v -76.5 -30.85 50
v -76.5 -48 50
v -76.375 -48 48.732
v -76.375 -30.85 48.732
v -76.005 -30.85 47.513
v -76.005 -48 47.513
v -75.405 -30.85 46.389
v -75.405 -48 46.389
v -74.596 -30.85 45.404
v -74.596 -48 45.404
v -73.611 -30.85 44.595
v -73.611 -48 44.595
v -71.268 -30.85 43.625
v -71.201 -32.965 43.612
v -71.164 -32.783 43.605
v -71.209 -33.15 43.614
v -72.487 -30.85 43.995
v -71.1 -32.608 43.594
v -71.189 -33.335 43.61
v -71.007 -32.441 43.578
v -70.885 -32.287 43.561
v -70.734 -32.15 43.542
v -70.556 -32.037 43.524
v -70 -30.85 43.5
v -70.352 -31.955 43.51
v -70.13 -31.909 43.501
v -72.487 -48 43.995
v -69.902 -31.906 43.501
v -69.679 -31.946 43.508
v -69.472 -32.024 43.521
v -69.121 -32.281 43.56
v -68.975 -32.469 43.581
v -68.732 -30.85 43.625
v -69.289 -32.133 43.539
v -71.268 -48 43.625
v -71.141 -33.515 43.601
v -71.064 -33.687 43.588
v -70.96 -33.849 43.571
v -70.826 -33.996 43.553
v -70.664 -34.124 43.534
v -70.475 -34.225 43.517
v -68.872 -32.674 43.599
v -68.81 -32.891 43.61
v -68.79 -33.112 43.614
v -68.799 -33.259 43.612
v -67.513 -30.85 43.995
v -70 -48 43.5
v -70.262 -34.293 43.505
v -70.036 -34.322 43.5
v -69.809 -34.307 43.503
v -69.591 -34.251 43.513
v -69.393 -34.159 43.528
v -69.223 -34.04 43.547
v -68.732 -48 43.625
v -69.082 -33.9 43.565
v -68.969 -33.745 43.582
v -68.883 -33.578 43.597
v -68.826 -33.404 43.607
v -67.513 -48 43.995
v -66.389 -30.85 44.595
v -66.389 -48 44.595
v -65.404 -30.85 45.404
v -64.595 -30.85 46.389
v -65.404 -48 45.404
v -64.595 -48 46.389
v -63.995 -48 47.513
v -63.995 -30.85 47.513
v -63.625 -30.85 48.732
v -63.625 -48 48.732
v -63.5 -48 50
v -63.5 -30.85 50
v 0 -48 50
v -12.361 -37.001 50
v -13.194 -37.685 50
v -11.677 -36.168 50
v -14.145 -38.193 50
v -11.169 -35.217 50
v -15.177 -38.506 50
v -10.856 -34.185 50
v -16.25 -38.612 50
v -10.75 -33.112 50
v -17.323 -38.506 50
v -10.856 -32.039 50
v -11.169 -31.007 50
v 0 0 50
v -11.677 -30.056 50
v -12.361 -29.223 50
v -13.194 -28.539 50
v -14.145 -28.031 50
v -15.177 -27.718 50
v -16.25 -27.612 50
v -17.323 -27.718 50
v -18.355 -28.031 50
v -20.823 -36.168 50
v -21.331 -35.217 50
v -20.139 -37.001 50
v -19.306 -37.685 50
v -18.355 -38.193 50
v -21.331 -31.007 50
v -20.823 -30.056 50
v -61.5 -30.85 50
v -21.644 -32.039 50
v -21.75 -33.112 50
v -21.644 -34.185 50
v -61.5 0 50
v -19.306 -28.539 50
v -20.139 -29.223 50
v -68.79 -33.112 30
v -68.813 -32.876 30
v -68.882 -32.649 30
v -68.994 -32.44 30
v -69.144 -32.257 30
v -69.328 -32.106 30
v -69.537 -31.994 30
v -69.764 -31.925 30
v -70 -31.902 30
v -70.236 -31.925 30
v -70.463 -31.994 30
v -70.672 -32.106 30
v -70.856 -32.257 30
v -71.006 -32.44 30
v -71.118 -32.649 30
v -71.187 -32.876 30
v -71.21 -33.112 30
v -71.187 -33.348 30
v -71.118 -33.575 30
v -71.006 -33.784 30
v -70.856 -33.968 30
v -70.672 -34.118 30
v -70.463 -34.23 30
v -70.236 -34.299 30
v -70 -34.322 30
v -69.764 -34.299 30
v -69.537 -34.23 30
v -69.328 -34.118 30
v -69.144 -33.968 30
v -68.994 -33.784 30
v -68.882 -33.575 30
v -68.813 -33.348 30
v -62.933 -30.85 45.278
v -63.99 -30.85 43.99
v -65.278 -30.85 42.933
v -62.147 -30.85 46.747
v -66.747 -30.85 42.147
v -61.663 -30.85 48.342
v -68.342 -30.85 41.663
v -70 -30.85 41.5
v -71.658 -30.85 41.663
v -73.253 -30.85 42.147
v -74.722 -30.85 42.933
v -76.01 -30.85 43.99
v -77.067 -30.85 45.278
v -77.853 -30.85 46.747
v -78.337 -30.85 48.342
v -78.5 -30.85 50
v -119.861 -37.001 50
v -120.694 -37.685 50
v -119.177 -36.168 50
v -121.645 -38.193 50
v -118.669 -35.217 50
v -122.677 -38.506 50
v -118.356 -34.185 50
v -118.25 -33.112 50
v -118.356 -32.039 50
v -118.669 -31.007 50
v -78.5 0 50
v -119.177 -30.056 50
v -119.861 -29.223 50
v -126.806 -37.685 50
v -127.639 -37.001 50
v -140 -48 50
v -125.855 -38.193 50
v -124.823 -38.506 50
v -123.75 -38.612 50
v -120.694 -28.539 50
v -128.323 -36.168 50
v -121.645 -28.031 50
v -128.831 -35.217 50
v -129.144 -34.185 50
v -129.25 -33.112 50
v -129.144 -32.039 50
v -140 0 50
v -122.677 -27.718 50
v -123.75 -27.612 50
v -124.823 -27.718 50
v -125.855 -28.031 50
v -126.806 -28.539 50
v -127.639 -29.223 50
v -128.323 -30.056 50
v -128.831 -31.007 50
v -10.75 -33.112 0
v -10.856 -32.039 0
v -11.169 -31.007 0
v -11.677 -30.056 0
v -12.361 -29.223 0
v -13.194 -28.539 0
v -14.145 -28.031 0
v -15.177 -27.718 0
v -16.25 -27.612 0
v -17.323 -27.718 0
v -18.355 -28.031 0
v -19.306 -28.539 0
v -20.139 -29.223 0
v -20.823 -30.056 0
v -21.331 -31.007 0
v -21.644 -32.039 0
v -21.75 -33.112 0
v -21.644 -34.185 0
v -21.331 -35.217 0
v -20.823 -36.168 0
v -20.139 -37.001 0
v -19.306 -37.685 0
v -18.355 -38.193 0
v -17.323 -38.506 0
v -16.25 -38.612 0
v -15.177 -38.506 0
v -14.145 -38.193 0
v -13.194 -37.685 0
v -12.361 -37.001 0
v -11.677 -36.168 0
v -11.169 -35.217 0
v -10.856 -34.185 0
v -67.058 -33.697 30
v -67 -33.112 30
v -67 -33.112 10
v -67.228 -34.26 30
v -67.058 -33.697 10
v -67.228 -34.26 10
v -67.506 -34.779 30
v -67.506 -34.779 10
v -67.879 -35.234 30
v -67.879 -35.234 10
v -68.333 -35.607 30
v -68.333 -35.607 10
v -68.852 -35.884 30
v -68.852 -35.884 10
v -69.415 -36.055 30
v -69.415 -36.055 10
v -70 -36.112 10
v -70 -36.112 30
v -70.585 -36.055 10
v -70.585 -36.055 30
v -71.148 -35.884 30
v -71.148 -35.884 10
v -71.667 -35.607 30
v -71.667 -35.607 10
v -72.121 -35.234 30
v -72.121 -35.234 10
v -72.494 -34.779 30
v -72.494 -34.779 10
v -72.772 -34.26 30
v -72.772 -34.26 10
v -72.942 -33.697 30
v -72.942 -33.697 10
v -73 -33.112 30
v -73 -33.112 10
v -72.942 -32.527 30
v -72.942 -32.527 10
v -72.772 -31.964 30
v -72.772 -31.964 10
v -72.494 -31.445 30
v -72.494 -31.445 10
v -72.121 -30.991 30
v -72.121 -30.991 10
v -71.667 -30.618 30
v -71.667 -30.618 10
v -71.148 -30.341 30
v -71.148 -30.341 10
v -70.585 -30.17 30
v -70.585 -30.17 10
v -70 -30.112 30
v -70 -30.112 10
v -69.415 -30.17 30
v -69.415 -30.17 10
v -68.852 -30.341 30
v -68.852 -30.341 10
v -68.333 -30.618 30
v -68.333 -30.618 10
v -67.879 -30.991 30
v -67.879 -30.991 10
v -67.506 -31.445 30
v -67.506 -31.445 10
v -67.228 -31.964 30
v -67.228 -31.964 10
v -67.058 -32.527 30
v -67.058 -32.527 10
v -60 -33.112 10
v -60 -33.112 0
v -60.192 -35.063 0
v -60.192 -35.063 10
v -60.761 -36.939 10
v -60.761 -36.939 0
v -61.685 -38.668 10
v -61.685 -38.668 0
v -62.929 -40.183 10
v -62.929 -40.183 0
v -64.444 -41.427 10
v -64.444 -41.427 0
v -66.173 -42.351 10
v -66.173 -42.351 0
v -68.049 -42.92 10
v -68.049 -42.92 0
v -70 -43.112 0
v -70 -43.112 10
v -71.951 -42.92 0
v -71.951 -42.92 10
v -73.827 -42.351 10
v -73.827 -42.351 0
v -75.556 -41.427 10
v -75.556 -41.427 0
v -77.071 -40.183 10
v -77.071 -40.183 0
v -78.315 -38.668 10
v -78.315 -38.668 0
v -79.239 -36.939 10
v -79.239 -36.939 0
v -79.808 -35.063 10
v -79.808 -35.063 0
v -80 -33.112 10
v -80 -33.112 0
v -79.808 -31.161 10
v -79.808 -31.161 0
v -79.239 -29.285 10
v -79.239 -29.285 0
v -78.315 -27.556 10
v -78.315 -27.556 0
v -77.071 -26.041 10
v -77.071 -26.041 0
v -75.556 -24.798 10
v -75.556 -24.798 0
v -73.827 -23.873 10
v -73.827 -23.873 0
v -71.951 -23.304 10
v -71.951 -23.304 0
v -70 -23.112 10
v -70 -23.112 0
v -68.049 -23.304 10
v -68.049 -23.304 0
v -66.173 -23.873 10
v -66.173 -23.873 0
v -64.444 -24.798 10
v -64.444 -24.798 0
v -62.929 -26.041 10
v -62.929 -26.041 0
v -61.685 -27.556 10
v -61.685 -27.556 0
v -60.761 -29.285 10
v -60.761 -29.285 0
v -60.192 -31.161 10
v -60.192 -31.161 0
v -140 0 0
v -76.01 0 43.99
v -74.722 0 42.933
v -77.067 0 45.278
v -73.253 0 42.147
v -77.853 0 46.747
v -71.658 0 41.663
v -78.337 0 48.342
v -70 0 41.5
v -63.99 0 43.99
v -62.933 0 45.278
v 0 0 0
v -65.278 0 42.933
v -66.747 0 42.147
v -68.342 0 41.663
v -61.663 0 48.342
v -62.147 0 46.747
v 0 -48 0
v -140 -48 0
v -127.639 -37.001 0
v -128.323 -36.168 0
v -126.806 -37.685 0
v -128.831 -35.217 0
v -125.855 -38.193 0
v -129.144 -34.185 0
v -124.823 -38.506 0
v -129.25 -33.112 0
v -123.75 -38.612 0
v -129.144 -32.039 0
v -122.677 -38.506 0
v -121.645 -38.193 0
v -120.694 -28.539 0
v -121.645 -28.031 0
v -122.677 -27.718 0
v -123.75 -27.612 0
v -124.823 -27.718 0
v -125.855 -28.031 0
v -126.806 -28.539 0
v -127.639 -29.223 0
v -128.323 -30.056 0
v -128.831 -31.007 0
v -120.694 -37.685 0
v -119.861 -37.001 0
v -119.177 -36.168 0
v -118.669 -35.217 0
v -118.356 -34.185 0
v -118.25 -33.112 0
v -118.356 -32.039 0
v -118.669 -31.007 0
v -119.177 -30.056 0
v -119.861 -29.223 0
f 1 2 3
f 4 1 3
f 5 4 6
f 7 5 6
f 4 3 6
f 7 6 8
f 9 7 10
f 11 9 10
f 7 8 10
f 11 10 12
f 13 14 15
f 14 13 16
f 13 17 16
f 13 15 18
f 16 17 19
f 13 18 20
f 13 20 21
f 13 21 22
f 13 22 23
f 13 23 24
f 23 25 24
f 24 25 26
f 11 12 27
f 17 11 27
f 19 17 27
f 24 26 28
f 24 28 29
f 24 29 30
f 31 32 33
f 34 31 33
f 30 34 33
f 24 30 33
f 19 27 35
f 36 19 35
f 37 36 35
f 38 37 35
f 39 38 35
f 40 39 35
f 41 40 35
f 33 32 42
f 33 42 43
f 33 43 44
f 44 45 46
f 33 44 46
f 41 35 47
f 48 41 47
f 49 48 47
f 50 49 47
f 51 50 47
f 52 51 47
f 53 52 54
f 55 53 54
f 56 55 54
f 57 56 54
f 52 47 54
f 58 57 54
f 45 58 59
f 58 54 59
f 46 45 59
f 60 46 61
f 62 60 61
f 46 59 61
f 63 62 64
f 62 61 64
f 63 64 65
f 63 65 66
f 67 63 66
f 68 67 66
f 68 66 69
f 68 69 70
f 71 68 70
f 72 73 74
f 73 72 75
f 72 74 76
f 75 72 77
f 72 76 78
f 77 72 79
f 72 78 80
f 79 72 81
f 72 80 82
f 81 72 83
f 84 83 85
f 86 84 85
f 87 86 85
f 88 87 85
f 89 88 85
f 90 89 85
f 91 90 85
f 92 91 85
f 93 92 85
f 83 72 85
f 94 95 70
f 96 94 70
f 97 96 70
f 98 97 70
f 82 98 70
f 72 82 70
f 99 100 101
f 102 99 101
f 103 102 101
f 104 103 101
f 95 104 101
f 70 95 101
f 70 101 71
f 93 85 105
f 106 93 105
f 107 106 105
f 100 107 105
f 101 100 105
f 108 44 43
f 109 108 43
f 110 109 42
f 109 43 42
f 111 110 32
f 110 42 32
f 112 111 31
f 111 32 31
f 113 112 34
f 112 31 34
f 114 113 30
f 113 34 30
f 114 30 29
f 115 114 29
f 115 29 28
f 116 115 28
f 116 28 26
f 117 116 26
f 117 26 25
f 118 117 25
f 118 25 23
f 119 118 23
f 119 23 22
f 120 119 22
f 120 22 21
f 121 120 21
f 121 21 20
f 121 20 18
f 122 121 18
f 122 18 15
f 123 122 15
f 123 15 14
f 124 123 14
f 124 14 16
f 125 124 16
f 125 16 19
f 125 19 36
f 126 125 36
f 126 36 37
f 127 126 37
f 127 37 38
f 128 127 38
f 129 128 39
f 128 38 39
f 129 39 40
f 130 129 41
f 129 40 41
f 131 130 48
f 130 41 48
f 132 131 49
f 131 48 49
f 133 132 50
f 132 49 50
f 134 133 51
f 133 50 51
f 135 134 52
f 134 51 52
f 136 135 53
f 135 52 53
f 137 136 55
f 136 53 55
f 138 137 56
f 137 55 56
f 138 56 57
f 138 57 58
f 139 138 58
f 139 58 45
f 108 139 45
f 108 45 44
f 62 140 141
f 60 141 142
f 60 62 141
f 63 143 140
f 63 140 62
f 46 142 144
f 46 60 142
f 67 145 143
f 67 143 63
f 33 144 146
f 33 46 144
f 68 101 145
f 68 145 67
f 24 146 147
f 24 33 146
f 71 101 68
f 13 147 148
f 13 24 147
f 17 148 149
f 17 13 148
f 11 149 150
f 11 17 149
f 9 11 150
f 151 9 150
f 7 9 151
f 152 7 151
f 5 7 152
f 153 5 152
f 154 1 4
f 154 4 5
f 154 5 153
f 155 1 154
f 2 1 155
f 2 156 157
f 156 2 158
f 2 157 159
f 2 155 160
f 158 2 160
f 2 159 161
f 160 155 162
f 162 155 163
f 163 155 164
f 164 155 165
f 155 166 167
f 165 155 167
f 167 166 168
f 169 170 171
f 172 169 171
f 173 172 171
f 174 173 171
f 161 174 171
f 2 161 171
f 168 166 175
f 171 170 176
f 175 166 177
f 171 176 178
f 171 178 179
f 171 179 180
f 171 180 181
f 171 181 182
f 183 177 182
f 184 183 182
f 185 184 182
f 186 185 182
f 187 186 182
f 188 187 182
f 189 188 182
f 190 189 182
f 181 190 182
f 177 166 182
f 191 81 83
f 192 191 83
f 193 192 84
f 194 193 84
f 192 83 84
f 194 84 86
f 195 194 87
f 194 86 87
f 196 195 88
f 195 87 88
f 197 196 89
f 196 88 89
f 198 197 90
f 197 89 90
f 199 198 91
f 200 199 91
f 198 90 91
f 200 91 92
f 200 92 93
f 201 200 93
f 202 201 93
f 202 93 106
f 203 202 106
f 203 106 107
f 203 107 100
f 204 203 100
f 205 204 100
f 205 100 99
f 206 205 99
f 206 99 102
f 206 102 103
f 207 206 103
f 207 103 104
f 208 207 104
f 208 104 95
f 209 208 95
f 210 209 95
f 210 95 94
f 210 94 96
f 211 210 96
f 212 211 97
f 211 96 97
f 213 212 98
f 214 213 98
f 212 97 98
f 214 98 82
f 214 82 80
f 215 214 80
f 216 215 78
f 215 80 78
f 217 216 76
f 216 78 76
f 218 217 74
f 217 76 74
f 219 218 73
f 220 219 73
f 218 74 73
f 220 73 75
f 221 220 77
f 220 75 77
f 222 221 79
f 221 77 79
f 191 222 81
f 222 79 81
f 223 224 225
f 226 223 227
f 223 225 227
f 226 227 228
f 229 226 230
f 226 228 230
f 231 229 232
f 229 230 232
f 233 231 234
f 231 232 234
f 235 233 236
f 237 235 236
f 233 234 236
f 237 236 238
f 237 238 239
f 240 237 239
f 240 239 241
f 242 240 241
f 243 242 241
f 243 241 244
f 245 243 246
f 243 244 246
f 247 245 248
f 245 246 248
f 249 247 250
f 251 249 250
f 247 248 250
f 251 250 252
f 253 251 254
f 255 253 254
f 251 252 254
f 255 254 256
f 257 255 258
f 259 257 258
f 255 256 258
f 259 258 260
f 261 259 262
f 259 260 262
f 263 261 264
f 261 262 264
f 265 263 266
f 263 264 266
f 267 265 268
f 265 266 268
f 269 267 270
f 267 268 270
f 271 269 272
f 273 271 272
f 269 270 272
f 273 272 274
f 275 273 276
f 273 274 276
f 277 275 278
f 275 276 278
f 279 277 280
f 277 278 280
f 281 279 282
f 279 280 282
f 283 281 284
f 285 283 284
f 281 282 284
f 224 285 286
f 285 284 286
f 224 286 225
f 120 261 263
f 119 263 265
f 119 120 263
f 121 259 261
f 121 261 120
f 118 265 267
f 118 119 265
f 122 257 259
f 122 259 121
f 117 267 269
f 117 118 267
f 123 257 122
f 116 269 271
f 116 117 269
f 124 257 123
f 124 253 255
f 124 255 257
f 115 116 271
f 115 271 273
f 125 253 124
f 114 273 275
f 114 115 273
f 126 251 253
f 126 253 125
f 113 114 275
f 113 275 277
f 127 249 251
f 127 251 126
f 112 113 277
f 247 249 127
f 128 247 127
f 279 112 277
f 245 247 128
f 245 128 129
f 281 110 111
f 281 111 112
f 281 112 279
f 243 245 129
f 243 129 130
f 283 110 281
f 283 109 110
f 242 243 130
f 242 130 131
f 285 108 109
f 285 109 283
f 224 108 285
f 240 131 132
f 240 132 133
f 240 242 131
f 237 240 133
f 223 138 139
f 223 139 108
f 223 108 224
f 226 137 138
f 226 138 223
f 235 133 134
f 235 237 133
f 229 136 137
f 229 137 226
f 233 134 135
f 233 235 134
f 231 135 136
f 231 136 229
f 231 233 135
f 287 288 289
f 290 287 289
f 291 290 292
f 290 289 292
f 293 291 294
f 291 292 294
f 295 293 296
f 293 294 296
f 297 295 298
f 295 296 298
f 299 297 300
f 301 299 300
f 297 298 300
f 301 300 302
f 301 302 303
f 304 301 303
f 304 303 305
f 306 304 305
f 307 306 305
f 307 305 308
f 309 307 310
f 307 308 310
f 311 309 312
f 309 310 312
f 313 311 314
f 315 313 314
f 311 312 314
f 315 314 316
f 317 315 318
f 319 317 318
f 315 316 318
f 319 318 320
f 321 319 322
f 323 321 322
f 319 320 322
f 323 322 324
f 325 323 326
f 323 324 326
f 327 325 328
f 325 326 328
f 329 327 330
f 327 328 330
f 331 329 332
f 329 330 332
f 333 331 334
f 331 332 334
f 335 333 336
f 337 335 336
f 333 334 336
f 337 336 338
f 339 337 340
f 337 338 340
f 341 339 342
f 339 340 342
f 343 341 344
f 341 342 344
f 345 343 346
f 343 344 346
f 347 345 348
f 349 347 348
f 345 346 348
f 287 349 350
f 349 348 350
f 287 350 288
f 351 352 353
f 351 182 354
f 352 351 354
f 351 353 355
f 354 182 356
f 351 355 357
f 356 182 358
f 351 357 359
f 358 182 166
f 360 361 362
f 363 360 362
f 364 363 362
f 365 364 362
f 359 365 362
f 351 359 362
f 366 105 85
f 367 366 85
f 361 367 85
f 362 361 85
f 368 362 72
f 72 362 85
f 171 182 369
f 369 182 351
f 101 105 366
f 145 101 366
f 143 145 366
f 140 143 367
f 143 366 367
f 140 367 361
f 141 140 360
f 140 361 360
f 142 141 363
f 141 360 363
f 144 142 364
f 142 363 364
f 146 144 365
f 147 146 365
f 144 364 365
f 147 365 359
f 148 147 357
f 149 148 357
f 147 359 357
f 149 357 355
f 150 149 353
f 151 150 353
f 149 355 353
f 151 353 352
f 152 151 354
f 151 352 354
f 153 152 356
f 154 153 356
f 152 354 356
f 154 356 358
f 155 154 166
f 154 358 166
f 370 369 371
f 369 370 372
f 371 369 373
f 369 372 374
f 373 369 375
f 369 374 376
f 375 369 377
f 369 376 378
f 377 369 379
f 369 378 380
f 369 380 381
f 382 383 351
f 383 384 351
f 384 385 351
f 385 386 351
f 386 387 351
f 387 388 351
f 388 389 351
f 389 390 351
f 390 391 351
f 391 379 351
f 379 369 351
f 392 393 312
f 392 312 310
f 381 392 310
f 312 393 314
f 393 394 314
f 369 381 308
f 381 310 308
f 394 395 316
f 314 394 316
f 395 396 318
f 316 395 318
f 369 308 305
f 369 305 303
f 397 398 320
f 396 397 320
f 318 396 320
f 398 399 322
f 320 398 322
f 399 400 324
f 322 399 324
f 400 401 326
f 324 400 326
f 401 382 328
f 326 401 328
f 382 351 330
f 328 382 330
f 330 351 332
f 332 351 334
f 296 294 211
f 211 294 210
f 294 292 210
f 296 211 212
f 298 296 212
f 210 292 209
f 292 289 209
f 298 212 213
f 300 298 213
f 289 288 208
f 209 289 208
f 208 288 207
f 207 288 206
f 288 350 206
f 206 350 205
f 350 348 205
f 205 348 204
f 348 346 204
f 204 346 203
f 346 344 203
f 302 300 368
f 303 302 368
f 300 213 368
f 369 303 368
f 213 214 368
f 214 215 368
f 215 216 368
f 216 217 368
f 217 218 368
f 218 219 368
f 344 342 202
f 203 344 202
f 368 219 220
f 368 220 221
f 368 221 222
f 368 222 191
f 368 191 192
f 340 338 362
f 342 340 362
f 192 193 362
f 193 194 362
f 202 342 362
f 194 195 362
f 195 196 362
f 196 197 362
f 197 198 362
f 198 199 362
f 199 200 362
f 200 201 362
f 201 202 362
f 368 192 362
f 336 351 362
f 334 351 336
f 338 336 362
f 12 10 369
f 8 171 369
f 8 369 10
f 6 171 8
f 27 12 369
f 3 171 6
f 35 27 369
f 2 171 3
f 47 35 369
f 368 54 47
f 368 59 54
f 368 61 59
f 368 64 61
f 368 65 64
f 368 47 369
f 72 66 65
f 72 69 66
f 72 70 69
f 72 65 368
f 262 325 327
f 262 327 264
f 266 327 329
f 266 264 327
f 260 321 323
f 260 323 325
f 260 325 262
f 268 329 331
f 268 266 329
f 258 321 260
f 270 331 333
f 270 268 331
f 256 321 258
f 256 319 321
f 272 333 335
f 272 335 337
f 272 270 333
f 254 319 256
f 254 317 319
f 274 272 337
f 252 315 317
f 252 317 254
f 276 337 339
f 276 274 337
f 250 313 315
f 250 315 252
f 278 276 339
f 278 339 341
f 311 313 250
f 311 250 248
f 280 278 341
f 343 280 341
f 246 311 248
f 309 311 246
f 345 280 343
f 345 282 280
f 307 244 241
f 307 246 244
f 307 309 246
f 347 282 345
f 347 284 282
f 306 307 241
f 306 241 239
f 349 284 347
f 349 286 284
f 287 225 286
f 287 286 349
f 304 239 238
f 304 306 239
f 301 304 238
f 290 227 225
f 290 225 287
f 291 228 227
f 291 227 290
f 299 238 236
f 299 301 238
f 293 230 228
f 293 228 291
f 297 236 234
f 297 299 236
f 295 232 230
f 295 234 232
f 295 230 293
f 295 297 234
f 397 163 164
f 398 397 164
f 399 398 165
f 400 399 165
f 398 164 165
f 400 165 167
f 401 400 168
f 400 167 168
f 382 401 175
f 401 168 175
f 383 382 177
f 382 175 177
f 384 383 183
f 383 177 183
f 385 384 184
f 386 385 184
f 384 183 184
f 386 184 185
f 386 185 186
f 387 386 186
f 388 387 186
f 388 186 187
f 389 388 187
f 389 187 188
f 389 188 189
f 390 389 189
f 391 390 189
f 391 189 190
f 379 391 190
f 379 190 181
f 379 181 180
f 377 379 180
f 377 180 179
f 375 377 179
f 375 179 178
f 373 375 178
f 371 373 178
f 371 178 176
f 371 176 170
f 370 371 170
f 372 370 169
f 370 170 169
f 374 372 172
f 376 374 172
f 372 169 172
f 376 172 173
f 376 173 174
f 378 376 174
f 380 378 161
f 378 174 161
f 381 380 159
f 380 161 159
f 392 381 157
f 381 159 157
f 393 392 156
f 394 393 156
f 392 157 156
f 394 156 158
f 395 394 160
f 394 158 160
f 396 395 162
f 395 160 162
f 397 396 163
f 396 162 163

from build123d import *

# Parameters (mm, degrees)
F1_DEPTH  = 48
F2_R      = 5.5
F3_DEPTH  = 50.001
F4_R      = 6.5
F5_DEPTH  = 20
F6_R      = 8.5
F7_DEPTH  = 30.85
F8_R      = 1.21
F9_DEPTH  = 50.001
F10_R     = 10
F11_DEPTH = 10
F12_R     = 3
F13_DEPTH = 20


with BuildPart() as f1:
    # F0 (on Front) → F1 (new body)
    with BuildSketch(Plane.XZ):
        Polygon((-140, 0), (0, 0), (0, 50), (-63.5, 50), (-76.5, 50), (-140, 50), align=None)
    extrude(amount=F1_DEPTH)

    # F2 (on face) → F3 (cut, through all)
    with BuildSketch(Plane.XY.offset(50)):
        with Locations((-123.75, -33.112)):
            Circle(F2_R)
        with Locations((-16.25, -33.112)):
            Circle(F2_R)
    extrude(amount=-F3_DEPTH, mode=Mode.SUBTRACT)

    # F4 (on face) → F5 (cut)
    with BuildSketch(Plane.XZ.offset(48)):
        with Locations((-70, 50)):
            Circle(F4_R)
    extrude(amount=-F5_DEPTH, mode=Mode.SUBTRACT)

    # F6 (on face) → F7 (cut)
    with BuildSketch(Plane(origin=(0, 0, 0), x_dir=(-1, 0, 0), z_dir=(0, 1, 0))):
        with Locations((70, 50)):
            Circle(F6_R)
    extrude(amount=-F7_DEPTH, mode=Mode.SUBTRACT)

    # F8 (on face) → F9 (cut, through all)
    with BuildSketch(Plane.XY.offset(50)):
        with Locations((-70, -33.112198)):
            Circle(F8_R)
    extrude(amount=-F9_DEPTH, mode=Mode.SUBTRACT)

    # F10 (on face) → F11 (cut)
    with BuildSketch(Plane(origin=(0, 0, 0), x_dir=(1, 0, 0), z_dir=(0, 0, -1))):
        with Locations((-70, 33.112198)):
            Circle(F10_R)
    extrude(amount=-F11_DEPTH, mode=Mode.SUBTRACT)

    # F12 (on face) → F13 (cut)
    with BuildSketch(Plane(origin=(0, 0, 10), x_dir=(1, 0, 0), z_dir=(0, 0, -1))):
        with Locations((-70, 33.112198)):
            Circle(F12_R)
    extrude(amount=-F13_DEPTH, mode=Mode.SUBTRACT)


solid = f1.part
